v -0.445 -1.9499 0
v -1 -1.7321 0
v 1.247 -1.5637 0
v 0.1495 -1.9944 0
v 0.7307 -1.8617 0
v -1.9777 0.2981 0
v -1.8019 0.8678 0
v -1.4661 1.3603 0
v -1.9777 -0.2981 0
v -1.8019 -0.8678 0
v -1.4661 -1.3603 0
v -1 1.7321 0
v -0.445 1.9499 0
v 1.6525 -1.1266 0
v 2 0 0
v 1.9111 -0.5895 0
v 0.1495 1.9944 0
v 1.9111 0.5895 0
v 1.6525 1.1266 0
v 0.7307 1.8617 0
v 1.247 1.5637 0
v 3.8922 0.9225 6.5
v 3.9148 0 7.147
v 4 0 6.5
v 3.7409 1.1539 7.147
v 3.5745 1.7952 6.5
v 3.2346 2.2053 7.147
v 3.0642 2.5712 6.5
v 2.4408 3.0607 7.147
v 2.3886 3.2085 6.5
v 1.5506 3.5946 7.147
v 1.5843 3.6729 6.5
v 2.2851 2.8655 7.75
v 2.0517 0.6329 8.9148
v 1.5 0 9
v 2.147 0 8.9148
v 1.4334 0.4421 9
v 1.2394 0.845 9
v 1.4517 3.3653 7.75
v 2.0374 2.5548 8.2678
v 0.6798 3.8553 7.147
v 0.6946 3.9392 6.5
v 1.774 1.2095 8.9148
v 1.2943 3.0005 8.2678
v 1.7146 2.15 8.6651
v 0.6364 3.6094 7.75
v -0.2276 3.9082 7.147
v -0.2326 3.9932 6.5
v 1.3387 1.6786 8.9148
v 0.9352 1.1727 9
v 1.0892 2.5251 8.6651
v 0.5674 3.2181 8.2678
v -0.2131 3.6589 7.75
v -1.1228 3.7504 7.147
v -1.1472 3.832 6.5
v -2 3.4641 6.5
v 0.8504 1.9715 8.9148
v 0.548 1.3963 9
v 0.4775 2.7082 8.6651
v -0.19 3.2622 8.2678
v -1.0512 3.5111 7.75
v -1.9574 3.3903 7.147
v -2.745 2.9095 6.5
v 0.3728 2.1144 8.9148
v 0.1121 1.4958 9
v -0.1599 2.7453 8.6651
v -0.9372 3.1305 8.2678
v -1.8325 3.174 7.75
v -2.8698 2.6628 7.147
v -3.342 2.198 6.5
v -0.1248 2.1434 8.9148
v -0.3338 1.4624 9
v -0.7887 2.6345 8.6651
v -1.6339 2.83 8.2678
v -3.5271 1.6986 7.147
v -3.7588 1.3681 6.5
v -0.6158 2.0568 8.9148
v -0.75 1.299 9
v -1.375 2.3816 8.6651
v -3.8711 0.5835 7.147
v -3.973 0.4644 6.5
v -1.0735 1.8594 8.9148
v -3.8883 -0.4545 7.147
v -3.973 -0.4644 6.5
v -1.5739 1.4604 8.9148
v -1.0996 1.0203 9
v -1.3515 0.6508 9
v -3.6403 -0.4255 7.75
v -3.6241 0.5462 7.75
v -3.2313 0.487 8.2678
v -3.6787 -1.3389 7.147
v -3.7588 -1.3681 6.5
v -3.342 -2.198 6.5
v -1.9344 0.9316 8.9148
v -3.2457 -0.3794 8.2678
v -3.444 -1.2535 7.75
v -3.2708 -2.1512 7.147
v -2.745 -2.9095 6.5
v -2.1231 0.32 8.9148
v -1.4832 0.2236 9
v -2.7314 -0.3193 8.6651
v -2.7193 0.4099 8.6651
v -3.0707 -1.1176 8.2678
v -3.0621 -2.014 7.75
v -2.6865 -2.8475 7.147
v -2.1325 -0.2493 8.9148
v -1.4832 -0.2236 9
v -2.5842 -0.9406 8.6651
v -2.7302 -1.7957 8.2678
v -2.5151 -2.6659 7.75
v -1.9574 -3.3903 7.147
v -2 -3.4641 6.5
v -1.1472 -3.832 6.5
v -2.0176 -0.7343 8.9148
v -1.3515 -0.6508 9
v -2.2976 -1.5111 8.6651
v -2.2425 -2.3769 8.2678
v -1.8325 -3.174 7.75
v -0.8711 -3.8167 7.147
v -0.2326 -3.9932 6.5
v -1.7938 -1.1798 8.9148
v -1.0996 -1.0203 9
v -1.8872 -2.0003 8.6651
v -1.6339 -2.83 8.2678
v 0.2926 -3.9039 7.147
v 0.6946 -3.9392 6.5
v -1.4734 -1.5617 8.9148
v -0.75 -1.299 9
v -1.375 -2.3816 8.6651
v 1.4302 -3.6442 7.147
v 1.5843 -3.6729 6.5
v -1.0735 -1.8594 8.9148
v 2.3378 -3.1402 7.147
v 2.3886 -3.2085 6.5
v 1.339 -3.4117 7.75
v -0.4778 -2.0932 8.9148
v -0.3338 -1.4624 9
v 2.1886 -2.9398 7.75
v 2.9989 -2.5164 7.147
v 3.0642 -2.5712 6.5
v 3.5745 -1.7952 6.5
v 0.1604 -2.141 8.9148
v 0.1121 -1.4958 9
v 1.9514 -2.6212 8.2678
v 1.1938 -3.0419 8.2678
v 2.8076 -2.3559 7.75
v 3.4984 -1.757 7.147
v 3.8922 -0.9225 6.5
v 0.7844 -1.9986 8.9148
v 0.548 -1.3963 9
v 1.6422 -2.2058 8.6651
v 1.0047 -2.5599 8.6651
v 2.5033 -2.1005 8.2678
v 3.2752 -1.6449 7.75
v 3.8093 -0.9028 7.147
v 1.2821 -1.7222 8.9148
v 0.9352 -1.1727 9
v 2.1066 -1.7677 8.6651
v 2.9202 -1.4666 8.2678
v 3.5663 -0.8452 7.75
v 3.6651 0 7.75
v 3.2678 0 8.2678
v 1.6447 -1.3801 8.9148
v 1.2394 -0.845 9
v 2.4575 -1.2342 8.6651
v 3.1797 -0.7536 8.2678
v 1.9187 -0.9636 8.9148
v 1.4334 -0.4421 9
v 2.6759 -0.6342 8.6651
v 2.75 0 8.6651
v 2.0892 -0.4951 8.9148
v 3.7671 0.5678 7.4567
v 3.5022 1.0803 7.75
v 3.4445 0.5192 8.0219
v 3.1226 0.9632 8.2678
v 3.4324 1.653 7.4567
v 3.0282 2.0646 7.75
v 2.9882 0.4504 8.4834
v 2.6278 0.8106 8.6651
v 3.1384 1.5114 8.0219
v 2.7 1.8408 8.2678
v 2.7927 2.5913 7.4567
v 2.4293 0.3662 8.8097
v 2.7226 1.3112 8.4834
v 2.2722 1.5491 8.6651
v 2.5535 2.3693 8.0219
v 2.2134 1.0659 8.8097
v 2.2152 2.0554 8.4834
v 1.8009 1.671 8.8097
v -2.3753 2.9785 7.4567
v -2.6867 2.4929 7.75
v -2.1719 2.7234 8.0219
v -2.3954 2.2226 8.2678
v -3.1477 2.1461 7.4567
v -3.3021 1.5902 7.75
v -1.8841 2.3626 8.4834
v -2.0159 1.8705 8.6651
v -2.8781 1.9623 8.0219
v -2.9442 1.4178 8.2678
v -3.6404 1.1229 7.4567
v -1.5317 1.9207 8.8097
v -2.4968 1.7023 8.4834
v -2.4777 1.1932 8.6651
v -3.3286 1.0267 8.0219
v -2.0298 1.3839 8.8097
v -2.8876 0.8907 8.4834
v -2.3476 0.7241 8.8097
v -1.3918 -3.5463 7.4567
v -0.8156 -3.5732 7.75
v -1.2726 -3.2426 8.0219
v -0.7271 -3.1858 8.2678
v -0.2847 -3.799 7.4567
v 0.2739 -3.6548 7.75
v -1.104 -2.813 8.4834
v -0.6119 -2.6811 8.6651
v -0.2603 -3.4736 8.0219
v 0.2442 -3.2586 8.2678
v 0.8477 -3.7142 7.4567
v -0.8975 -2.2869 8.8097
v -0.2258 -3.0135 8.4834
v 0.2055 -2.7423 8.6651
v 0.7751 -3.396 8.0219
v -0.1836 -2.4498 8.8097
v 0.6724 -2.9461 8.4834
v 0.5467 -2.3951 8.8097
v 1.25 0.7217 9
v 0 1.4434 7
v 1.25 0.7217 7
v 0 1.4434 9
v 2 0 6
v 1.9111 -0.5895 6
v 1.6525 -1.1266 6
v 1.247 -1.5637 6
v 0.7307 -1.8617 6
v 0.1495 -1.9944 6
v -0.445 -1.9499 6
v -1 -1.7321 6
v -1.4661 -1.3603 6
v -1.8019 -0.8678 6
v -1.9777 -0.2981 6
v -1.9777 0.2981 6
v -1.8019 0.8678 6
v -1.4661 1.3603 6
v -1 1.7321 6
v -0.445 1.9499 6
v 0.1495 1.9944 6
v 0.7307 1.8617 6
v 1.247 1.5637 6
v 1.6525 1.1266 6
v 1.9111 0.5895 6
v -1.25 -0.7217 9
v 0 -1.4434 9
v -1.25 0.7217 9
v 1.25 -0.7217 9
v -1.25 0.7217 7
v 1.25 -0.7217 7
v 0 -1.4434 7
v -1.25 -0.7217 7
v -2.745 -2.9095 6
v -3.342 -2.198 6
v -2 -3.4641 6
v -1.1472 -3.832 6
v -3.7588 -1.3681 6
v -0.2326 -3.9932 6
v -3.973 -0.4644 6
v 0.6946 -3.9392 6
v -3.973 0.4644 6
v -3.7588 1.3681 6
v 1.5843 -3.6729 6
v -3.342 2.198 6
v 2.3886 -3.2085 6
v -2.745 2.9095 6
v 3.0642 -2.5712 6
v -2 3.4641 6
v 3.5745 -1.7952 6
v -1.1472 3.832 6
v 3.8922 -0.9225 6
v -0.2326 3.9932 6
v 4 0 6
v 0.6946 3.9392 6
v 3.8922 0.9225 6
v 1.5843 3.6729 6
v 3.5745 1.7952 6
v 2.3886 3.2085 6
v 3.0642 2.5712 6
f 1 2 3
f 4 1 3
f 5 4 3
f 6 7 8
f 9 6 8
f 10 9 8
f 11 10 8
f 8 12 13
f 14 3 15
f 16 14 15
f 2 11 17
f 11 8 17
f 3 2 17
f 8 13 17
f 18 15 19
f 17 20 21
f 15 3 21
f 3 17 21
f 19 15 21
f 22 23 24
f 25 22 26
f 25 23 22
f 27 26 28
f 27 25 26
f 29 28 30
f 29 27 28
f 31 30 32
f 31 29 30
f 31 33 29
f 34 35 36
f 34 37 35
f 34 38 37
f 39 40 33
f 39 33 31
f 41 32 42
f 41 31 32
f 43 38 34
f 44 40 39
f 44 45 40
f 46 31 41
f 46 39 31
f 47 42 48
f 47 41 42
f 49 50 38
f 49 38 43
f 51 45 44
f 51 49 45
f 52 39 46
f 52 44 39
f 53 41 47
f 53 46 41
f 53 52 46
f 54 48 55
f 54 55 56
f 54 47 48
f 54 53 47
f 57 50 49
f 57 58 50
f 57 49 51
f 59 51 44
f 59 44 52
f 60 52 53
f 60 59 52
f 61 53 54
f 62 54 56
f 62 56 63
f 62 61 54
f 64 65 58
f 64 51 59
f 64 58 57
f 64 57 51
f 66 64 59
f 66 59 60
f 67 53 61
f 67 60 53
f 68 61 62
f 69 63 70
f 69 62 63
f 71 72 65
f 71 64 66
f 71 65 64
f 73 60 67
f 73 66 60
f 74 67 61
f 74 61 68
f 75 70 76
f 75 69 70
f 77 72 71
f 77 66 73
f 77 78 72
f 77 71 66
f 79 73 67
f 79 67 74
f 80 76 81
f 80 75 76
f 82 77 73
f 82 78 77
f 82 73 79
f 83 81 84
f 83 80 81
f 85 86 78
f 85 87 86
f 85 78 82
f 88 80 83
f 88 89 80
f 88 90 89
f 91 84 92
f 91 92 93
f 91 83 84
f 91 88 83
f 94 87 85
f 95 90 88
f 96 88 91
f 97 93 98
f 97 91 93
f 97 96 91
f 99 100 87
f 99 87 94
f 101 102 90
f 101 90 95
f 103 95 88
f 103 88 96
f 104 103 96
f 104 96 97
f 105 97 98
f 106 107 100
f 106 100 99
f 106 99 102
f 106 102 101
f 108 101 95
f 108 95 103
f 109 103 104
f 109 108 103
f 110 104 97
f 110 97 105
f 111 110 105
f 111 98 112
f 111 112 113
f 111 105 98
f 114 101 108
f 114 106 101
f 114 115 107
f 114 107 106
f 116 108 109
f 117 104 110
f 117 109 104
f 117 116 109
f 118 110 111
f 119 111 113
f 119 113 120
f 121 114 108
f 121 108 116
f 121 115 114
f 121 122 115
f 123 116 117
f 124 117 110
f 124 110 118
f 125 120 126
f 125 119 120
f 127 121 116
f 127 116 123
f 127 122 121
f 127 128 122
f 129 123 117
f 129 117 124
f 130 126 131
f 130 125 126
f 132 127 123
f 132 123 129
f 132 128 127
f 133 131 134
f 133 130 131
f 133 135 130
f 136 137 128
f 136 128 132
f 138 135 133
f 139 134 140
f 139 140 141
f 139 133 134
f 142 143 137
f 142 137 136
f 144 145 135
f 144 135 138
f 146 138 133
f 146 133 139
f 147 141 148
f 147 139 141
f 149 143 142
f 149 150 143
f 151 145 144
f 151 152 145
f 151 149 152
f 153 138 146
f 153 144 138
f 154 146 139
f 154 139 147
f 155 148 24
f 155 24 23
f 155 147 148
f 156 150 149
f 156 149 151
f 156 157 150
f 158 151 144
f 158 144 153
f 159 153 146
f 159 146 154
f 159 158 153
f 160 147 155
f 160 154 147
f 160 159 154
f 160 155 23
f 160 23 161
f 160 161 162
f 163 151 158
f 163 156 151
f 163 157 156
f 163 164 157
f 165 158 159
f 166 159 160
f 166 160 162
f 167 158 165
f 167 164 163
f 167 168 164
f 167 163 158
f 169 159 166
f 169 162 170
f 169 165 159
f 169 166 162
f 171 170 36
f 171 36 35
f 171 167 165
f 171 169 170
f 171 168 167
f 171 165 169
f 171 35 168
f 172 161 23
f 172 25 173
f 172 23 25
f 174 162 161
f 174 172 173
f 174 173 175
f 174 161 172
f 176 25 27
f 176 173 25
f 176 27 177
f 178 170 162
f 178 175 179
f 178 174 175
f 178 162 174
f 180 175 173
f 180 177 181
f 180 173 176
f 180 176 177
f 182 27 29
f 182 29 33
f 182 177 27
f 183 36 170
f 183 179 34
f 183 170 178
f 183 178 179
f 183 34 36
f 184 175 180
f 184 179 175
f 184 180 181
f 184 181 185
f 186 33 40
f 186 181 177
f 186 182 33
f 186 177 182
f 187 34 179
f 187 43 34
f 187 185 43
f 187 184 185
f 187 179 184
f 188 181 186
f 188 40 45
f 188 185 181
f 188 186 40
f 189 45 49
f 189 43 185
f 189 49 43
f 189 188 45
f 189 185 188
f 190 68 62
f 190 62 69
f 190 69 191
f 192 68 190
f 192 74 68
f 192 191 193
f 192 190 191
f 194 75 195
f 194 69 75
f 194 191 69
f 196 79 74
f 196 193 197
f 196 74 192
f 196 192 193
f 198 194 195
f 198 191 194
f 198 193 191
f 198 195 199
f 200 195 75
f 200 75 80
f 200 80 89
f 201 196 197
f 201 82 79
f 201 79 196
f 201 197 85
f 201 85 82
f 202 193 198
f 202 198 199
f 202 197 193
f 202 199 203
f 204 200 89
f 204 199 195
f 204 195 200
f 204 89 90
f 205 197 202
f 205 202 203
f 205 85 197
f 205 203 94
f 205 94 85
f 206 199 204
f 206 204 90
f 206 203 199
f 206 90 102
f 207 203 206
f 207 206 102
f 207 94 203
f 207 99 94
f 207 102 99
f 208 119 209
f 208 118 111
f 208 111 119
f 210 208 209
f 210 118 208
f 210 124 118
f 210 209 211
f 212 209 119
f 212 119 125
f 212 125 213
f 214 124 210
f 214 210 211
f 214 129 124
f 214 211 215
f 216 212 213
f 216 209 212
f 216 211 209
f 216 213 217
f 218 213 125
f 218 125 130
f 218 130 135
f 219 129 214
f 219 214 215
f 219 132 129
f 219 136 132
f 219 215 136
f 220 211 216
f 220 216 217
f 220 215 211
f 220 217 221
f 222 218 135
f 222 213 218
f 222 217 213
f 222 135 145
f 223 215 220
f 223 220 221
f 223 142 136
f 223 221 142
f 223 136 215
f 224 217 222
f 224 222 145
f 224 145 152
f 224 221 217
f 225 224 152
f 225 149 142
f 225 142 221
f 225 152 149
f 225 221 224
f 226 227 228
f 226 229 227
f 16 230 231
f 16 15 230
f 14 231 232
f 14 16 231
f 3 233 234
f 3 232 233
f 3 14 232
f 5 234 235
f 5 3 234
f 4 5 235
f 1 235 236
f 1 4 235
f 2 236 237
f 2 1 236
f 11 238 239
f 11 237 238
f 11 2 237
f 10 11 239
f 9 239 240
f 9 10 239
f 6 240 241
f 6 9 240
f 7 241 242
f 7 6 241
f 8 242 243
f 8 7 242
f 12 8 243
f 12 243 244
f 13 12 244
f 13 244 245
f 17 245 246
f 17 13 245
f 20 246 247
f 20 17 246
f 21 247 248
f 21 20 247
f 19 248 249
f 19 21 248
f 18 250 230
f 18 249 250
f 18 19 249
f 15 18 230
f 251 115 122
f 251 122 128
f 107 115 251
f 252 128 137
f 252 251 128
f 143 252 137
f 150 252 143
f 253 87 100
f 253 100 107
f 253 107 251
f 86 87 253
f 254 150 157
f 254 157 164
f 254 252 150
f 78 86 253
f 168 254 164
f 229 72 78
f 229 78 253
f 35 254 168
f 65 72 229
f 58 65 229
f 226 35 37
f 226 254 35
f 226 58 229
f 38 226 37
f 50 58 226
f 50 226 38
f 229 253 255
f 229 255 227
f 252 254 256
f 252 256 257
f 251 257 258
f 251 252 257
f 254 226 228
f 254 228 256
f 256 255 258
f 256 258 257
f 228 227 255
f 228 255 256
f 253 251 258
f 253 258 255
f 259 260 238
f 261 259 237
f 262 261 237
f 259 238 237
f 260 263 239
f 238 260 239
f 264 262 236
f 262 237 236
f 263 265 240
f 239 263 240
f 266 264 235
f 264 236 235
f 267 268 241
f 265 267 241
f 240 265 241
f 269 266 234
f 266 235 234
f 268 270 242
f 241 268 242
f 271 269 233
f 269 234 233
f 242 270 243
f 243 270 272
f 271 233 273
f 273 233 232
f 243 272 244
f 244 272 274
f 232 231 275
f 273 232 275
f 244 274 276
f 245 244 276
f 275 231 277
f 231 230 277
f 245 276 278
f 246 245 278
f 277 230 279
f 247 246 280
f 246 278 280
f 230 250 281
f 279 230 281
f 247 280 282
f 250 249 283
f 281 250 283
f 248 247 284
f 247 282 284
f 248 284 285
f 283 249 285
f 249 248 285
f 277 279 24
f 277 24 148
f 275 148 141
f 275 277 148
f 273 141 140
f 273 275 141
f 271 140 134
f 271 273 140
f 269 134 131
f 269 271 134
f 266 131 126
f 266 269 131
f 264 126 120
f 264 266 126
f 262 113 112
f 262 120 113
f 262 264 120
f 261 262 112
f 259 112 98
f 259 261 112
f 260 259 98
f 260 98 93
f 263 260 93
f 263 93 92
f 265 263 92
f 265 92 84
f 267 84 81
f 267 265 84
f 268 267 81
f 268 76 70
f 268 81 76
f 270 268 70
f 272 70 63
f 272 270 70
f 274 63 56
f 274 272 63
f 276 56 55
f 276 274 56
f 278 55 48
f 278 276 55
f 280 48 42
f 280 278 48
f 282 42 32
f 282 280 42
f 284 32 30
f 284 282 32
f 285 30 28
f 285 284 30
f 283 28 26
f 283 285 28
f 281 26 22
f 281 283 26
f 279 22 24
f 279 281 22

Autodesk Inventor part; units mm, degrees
ref_plane "YZ Plane" through (0, 0, 0) normal (1, 0, 0) x (0, 1, 0)
ref_plane "XZ Plane" through (0, 0, 0) normal (0, 1, 0) x (-1, 0, 0)
ref_plane "XY Plane" through (0, 0, 0) normal (0, 0, 1) x (1, 0, 0)
sketch "スケッチ1" plane through (0, 0, 0) normal (0, 0, 1) x (1, 0, 0)
  circle A0 centre (0, 0) radius 2
  dimension "d0" = 4
extrude "押し出し1" add sketch "スケッチ1" along normal blind 6
sketch "スケッチ2" plane through (0, 0, 6) normal (0, 0, 1) x (1, 0, 0)
  circle A0 centre (0, 0) radius 2 projected
  circle A1 centre (0, 0) radius 4
  dimension "d3" = 8
extrude "押し出し2" add sketch "スケッチ2" along normal blind 3 contours A0 | A1
fillet "フィレット1" radius 2.5 1 edges at (-4, 0, 9)
thread "ねじ1" size "M4x0.7" class "6g" standard "ANSI Metric M Profile" full length
sketch "スケッチ3" plane through (0, 0, 9) normal (0, 0, 1) x (1, 0, 0)
  line L0 (0, 1.4434) -> (1.25, 0.7217)
  line L1 (1.25, 0.7217) -> (1.25, -0.7217)
  line L2 (1.25, -0.7217) -> (0, -1.4434)
  line L3 (0, -1.4434) -> (-1.25, -0.7217)
  line L4 (-1.25, -0.7217) -> (-1.25, 0.7217)
  line L5 (-1.25, 0.7217) -> (0, 1.4434)
  point P0 (0, 0)
  point P1 (0, 0)
  dimension "d10" = 2.5
extrude "押し出し3" cut sketch "スケッチ3" against normal blind 2
properties part number "ネジボタン4L6" material "Stainless Steel, 440C"
